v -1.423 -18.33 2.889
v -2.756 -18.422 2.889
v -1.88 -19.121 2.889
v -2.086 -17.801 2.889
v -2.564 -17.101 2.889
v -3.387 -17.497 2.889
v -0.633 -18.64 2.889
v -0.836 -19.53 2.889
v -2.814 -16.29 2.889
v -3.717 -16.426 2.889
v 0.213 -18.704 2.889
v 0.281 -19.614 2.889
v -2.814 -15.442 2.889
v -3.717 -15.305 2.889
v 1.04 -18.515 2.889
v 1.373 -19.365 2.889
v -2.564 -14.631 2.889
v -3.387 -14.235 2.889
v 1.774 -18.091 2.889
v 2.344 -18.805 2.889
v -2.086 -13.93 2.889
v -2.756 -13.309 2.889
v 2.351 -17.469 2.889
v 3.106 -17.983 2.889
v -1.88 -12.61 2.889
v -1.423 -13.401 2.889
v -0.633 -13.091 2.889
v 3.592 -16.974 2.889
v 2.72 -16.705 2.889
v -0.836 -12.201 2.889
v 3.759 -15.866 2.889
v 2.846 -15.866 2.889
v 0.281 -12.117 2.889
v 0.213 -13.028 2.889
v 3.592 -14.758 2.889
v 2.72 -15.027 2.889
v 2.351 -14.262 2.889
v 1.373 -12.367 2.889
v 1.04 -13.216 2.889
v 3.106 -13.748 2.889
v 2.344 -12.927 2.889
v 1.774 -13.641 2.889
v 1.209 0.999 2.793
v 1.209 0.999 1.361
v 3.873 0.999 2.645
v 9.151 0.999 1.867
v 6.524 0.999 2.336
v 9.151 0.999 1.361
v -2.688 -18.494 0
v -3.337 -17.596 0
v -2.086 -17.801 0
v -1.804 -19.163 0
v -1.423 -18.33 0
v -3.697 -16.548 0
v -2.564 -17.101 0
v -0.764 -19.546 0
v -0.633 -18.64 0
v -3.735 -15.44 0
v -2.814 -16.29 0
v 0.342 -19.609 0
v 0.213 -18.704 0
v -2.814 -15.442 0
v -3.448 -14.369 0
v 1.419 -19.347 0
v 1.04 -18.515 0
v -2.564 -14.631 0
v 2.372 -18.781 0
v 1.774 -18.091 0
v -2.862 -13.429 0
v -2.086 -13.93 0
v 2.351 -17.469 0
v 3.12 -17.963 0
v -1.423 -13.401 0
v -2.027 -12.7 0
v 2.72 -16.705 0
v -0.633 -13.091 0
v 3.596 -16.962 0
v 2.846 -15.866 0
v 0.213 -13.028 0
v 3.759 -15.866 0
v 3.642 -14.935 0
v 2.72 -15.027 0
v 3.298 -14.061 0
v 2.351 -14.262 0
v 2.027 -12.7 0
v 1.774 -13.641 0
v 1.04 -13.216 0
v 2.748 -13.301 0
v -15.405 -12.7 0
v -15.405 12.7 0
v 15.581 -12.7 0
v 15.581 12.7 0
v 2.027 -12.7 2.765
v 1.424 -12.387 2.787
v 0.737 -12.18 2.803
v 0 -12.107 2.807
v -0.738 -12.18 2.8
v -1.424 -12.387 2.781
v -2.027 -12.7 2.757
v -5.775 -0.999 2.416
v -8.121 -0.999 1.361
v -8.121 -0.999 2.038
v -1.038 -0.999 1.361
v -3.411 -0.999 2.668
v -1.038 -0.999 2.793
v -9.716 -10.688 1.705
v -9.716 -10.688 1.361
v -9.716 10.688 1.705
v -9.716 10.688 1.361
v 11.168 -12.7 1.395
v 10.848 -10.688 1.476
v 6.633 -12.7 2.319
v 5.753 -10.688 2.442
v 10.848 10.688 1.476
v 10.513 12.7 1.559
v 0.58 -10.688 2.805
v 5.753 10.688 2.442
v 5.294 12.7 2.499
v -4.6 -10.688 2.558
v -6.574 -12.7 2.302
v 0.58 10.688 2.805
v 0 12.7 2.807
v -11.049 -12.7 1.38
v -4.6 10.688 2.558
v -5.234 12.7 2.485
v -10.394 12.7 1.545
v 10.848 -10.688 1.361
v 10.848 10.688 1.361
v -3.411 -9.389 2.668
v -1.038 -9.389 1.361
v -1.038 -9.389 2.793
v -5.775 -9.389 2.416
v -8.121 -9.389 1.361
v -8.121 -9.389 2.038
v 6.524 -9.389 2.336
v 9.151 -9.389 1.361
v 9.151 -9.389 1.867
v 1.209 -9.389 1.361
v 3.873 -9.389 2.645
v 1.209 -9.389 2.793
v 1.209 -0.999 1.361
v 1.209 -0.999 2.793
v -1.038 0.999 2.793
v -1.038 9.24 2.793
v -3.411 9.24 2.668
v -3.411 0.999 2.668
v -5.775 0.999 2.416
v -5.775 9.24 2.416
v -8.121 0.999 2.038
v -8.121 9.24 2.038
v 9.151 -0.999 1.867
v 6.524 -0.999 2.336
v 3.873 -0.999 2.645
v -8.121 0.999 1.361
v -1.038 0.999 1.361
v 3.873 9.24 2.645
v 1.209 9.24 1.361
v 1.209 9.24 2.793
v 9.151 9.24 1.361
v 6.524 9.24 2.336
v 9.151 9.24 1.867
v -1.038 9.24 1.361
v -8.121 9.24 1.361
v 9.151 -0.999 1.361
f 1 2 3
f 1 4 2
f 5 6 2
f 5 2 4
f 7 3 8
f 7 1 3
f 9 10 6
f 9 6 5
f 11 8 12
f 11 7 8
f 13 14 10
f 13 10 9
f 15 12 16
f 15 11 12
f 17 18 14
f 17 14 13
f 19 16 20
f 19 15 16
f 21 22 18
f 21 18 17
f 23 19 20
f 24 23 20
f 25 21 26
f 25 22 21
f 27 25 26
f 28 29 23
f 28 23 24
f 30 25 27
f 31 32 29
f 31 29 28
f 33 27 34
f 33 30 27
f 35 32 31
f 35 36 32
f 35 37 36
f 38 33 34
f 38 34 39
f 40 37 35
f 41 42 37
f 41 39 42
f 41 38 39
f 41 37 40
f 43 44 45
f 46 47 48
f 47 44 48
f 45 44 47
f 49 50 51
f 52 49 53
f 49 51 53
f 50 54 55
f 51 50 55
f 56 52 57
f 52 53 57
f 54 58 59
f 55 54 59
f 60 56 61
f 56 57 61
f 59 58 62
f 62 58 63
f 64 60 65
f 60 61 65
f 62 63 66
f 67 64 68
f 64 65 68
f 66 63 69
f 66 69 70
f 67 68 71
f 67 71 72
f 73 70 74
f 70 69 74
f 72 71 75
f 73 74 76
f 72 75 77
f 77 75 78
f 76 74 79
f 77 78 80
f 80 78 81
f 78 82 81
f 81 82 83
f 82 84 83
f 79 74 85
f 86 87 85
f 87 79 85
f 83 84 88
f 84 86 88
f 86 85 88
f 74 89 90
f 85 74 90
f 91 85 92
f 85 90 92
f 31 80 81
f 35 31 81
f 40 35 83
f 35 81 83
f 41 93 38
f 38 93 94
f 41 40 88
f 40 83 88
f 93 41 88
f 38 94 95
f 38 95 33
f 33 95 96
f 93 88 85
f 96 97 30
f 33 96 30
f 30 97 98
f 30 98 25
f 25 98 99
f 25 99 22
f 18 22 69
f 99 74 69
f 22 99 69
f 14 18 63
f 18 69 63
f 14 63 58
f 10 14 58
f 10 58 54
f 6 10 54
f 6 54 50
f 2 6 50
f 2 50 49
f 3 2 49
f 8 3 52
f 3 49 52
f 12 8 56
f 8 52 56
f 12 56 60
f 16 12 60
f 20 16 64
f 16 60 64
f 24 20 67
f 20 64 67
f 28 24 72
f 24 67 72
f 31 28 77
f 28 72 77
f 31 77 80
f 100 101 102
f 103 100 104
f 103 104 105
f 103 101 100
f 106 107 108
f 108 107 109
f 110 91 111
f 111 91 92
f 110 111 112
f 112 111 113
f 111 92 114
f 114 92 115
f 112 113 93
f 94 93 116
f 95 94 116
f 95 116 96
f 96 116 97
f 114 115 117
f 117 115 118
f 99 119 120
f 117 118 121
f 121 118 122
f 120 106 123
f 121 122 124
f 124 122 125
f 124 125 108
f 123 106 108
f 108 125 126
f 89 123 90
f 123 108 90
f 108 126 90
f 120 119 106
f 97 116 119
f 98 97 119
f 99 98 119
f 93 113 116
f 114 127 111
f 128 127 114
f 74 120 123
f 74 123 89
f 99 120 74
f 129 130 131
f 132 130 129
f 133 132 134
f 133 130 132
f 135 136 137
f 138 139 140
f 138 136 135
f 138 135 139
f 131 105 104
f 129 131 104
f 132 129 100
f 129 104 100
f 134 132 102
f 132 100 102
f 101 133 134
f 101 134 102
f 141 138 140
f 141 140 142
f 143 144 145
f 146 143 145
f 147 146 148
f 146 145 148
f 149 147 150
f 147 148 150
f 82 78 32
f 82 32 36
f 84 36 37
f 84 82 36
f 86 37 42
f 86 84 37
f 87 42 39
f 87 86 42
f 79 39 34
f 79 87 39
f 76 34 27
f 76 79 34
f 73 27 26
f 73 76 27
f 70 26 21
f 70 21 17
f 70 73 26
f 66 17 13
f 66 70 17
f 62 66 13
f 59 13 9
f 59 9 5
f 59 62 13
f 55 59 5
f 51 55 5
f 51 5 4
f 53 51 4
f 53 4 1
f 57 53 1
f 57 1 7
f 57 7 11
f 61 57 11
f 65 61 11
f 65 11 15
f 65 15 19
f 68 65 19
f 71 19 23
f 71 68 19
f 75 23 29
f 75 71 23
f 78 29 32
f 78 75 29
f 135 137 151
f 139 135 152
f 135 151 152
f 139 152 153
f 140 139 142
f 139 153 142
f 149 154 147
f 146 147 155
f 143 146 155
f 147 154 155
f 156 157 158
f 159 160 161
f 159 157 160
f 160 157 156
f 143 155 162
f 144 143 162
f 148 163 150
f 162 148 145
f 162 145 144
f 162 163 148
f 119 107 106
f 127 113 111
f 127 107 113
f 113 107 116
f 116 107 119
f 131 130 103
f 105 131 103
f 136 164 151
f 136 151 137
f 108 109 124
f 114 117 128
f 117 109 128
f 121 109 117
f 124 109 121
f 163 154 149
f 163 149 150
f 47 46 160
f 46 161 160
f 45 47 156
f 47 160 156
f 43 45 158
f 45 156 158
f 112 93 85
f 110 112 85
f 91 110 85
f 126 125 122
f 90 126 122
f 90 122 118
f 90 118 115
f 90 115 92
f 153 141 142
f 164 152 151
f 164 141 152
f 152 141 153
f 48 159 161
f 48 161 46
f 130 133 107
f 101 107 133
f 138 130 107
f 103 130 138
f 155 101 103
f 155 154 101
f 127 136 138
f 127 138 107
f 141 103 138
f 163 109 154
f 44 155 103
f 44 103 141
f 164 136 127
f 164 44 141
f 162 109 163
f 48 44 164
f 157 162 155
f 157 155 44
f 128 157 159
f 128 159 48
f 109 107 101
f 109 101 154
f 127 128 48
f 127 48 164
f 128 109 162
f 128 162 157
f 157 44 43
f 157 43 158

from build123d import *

# Parameters (mm, degrees)
F1_DEPTH      = 12.7
F1_DEPTH_BACK = 12.7
F2_R          = 3.7590001639
F2_R_2        = 2.8460000729
F3_DEPTH      = 2.888742
F5_START      = 1.36109
F4_W          = 20.5638939515
F4_H          = 21.3759541512
F4_W_2        = 2.247471828
F4_H_2        = 8.3905622596
F4_H_3        = 8.2407301525
F4_W_3        = 7.9414884094
F4_H_4        = 1.9977528136
F4_W_4        = 7.082369877
F5_DEPTH      = 1.68691


with BuildPart() as f1:
    # F0 (on Front) → F1 (new body, two sides)
    with BuildSketch(Plane.XZ) as f1_sk:
        with BuildLine():
            ThreePointArc((0, 2.8072327841), (-7.8279825435, 2.0919570377), (-15.405095836, 0))
            Line((-15.405095836, 0), (0, 0))
            Line((0, 0), (0, 2.8072327841))
        make_face()
        with BuildLine():
            Line((0, 2.8072327841), (0, 0))
            Line((0, 0), (15.581065618, 0))
            ThreePointArc((15.581065618, 0), (7.9173771666, 2.1076443124), (0, 2.8072327841))
        make_face()
    extrude(amount=F1_DEPTH)
    extrude(f1_sk.sketch, amount=-F1_DEPTH_BACK)

    # F2 (on Top) → F3 (join)
    with BuildSketch(Plane.XY):
        with Locations((0, -15.8657003194)):
            Circle(F2_R)
        with Locations((0, -15.8657003194)):
            Circle(F2_R_2, mode=Mode.SUBTRACT)
    extrude(amount=F3_DEPTH)

    # F4 (on Top) → F5 (cut)
    with BuildSketch(Plane.XY.offset(F5_START)):
        with Locations((0.5664420314, 0)):
            Rectangle(F4_W, F4_H)
        Polygon((-8.1206136383, 0.9988764068), (-8.1206136383, 9.2396065593), (-1.0382437613, 9.2396065593), (1.2092280667, 9.2396065593), (9.1507164761, 9.2396065593), (9.1507164761, 0.9988764068), (9.1507164761, -0.9988764068), (9.1507164761, -9.3894386664), (1.2092280667, -9.3894386664), (-1.0382437613, -9.3894386664), (-8.1206136383, -9.3894386664), (-8.1206136383, -0.9988764068), align=None, mode=Mode.SUBTRACT)
        with Locations((0.0854921527, -5.1941575366)):
            Rectangle(F4_W_2, F4_H_2)
        with Locations((0.0854921527, 5.119241483)):
            Rectangle(F4_W_2, F4_H_3)
        with Locations((5.1799722714, 0)):
            Rectangle(F4_W_3, F4_H_4)
        with Locations((-4.5794286998, 0)):
            Rectangle(F4_W_4, F4_H_4)
        with Locations((0.0854921527, 0)):
            Rectangle(F4_W_2, F4_H_4)
    extrude(amount=F5_DEPTH, mode=Mode.SUBTRACT)


solid = f1.part
